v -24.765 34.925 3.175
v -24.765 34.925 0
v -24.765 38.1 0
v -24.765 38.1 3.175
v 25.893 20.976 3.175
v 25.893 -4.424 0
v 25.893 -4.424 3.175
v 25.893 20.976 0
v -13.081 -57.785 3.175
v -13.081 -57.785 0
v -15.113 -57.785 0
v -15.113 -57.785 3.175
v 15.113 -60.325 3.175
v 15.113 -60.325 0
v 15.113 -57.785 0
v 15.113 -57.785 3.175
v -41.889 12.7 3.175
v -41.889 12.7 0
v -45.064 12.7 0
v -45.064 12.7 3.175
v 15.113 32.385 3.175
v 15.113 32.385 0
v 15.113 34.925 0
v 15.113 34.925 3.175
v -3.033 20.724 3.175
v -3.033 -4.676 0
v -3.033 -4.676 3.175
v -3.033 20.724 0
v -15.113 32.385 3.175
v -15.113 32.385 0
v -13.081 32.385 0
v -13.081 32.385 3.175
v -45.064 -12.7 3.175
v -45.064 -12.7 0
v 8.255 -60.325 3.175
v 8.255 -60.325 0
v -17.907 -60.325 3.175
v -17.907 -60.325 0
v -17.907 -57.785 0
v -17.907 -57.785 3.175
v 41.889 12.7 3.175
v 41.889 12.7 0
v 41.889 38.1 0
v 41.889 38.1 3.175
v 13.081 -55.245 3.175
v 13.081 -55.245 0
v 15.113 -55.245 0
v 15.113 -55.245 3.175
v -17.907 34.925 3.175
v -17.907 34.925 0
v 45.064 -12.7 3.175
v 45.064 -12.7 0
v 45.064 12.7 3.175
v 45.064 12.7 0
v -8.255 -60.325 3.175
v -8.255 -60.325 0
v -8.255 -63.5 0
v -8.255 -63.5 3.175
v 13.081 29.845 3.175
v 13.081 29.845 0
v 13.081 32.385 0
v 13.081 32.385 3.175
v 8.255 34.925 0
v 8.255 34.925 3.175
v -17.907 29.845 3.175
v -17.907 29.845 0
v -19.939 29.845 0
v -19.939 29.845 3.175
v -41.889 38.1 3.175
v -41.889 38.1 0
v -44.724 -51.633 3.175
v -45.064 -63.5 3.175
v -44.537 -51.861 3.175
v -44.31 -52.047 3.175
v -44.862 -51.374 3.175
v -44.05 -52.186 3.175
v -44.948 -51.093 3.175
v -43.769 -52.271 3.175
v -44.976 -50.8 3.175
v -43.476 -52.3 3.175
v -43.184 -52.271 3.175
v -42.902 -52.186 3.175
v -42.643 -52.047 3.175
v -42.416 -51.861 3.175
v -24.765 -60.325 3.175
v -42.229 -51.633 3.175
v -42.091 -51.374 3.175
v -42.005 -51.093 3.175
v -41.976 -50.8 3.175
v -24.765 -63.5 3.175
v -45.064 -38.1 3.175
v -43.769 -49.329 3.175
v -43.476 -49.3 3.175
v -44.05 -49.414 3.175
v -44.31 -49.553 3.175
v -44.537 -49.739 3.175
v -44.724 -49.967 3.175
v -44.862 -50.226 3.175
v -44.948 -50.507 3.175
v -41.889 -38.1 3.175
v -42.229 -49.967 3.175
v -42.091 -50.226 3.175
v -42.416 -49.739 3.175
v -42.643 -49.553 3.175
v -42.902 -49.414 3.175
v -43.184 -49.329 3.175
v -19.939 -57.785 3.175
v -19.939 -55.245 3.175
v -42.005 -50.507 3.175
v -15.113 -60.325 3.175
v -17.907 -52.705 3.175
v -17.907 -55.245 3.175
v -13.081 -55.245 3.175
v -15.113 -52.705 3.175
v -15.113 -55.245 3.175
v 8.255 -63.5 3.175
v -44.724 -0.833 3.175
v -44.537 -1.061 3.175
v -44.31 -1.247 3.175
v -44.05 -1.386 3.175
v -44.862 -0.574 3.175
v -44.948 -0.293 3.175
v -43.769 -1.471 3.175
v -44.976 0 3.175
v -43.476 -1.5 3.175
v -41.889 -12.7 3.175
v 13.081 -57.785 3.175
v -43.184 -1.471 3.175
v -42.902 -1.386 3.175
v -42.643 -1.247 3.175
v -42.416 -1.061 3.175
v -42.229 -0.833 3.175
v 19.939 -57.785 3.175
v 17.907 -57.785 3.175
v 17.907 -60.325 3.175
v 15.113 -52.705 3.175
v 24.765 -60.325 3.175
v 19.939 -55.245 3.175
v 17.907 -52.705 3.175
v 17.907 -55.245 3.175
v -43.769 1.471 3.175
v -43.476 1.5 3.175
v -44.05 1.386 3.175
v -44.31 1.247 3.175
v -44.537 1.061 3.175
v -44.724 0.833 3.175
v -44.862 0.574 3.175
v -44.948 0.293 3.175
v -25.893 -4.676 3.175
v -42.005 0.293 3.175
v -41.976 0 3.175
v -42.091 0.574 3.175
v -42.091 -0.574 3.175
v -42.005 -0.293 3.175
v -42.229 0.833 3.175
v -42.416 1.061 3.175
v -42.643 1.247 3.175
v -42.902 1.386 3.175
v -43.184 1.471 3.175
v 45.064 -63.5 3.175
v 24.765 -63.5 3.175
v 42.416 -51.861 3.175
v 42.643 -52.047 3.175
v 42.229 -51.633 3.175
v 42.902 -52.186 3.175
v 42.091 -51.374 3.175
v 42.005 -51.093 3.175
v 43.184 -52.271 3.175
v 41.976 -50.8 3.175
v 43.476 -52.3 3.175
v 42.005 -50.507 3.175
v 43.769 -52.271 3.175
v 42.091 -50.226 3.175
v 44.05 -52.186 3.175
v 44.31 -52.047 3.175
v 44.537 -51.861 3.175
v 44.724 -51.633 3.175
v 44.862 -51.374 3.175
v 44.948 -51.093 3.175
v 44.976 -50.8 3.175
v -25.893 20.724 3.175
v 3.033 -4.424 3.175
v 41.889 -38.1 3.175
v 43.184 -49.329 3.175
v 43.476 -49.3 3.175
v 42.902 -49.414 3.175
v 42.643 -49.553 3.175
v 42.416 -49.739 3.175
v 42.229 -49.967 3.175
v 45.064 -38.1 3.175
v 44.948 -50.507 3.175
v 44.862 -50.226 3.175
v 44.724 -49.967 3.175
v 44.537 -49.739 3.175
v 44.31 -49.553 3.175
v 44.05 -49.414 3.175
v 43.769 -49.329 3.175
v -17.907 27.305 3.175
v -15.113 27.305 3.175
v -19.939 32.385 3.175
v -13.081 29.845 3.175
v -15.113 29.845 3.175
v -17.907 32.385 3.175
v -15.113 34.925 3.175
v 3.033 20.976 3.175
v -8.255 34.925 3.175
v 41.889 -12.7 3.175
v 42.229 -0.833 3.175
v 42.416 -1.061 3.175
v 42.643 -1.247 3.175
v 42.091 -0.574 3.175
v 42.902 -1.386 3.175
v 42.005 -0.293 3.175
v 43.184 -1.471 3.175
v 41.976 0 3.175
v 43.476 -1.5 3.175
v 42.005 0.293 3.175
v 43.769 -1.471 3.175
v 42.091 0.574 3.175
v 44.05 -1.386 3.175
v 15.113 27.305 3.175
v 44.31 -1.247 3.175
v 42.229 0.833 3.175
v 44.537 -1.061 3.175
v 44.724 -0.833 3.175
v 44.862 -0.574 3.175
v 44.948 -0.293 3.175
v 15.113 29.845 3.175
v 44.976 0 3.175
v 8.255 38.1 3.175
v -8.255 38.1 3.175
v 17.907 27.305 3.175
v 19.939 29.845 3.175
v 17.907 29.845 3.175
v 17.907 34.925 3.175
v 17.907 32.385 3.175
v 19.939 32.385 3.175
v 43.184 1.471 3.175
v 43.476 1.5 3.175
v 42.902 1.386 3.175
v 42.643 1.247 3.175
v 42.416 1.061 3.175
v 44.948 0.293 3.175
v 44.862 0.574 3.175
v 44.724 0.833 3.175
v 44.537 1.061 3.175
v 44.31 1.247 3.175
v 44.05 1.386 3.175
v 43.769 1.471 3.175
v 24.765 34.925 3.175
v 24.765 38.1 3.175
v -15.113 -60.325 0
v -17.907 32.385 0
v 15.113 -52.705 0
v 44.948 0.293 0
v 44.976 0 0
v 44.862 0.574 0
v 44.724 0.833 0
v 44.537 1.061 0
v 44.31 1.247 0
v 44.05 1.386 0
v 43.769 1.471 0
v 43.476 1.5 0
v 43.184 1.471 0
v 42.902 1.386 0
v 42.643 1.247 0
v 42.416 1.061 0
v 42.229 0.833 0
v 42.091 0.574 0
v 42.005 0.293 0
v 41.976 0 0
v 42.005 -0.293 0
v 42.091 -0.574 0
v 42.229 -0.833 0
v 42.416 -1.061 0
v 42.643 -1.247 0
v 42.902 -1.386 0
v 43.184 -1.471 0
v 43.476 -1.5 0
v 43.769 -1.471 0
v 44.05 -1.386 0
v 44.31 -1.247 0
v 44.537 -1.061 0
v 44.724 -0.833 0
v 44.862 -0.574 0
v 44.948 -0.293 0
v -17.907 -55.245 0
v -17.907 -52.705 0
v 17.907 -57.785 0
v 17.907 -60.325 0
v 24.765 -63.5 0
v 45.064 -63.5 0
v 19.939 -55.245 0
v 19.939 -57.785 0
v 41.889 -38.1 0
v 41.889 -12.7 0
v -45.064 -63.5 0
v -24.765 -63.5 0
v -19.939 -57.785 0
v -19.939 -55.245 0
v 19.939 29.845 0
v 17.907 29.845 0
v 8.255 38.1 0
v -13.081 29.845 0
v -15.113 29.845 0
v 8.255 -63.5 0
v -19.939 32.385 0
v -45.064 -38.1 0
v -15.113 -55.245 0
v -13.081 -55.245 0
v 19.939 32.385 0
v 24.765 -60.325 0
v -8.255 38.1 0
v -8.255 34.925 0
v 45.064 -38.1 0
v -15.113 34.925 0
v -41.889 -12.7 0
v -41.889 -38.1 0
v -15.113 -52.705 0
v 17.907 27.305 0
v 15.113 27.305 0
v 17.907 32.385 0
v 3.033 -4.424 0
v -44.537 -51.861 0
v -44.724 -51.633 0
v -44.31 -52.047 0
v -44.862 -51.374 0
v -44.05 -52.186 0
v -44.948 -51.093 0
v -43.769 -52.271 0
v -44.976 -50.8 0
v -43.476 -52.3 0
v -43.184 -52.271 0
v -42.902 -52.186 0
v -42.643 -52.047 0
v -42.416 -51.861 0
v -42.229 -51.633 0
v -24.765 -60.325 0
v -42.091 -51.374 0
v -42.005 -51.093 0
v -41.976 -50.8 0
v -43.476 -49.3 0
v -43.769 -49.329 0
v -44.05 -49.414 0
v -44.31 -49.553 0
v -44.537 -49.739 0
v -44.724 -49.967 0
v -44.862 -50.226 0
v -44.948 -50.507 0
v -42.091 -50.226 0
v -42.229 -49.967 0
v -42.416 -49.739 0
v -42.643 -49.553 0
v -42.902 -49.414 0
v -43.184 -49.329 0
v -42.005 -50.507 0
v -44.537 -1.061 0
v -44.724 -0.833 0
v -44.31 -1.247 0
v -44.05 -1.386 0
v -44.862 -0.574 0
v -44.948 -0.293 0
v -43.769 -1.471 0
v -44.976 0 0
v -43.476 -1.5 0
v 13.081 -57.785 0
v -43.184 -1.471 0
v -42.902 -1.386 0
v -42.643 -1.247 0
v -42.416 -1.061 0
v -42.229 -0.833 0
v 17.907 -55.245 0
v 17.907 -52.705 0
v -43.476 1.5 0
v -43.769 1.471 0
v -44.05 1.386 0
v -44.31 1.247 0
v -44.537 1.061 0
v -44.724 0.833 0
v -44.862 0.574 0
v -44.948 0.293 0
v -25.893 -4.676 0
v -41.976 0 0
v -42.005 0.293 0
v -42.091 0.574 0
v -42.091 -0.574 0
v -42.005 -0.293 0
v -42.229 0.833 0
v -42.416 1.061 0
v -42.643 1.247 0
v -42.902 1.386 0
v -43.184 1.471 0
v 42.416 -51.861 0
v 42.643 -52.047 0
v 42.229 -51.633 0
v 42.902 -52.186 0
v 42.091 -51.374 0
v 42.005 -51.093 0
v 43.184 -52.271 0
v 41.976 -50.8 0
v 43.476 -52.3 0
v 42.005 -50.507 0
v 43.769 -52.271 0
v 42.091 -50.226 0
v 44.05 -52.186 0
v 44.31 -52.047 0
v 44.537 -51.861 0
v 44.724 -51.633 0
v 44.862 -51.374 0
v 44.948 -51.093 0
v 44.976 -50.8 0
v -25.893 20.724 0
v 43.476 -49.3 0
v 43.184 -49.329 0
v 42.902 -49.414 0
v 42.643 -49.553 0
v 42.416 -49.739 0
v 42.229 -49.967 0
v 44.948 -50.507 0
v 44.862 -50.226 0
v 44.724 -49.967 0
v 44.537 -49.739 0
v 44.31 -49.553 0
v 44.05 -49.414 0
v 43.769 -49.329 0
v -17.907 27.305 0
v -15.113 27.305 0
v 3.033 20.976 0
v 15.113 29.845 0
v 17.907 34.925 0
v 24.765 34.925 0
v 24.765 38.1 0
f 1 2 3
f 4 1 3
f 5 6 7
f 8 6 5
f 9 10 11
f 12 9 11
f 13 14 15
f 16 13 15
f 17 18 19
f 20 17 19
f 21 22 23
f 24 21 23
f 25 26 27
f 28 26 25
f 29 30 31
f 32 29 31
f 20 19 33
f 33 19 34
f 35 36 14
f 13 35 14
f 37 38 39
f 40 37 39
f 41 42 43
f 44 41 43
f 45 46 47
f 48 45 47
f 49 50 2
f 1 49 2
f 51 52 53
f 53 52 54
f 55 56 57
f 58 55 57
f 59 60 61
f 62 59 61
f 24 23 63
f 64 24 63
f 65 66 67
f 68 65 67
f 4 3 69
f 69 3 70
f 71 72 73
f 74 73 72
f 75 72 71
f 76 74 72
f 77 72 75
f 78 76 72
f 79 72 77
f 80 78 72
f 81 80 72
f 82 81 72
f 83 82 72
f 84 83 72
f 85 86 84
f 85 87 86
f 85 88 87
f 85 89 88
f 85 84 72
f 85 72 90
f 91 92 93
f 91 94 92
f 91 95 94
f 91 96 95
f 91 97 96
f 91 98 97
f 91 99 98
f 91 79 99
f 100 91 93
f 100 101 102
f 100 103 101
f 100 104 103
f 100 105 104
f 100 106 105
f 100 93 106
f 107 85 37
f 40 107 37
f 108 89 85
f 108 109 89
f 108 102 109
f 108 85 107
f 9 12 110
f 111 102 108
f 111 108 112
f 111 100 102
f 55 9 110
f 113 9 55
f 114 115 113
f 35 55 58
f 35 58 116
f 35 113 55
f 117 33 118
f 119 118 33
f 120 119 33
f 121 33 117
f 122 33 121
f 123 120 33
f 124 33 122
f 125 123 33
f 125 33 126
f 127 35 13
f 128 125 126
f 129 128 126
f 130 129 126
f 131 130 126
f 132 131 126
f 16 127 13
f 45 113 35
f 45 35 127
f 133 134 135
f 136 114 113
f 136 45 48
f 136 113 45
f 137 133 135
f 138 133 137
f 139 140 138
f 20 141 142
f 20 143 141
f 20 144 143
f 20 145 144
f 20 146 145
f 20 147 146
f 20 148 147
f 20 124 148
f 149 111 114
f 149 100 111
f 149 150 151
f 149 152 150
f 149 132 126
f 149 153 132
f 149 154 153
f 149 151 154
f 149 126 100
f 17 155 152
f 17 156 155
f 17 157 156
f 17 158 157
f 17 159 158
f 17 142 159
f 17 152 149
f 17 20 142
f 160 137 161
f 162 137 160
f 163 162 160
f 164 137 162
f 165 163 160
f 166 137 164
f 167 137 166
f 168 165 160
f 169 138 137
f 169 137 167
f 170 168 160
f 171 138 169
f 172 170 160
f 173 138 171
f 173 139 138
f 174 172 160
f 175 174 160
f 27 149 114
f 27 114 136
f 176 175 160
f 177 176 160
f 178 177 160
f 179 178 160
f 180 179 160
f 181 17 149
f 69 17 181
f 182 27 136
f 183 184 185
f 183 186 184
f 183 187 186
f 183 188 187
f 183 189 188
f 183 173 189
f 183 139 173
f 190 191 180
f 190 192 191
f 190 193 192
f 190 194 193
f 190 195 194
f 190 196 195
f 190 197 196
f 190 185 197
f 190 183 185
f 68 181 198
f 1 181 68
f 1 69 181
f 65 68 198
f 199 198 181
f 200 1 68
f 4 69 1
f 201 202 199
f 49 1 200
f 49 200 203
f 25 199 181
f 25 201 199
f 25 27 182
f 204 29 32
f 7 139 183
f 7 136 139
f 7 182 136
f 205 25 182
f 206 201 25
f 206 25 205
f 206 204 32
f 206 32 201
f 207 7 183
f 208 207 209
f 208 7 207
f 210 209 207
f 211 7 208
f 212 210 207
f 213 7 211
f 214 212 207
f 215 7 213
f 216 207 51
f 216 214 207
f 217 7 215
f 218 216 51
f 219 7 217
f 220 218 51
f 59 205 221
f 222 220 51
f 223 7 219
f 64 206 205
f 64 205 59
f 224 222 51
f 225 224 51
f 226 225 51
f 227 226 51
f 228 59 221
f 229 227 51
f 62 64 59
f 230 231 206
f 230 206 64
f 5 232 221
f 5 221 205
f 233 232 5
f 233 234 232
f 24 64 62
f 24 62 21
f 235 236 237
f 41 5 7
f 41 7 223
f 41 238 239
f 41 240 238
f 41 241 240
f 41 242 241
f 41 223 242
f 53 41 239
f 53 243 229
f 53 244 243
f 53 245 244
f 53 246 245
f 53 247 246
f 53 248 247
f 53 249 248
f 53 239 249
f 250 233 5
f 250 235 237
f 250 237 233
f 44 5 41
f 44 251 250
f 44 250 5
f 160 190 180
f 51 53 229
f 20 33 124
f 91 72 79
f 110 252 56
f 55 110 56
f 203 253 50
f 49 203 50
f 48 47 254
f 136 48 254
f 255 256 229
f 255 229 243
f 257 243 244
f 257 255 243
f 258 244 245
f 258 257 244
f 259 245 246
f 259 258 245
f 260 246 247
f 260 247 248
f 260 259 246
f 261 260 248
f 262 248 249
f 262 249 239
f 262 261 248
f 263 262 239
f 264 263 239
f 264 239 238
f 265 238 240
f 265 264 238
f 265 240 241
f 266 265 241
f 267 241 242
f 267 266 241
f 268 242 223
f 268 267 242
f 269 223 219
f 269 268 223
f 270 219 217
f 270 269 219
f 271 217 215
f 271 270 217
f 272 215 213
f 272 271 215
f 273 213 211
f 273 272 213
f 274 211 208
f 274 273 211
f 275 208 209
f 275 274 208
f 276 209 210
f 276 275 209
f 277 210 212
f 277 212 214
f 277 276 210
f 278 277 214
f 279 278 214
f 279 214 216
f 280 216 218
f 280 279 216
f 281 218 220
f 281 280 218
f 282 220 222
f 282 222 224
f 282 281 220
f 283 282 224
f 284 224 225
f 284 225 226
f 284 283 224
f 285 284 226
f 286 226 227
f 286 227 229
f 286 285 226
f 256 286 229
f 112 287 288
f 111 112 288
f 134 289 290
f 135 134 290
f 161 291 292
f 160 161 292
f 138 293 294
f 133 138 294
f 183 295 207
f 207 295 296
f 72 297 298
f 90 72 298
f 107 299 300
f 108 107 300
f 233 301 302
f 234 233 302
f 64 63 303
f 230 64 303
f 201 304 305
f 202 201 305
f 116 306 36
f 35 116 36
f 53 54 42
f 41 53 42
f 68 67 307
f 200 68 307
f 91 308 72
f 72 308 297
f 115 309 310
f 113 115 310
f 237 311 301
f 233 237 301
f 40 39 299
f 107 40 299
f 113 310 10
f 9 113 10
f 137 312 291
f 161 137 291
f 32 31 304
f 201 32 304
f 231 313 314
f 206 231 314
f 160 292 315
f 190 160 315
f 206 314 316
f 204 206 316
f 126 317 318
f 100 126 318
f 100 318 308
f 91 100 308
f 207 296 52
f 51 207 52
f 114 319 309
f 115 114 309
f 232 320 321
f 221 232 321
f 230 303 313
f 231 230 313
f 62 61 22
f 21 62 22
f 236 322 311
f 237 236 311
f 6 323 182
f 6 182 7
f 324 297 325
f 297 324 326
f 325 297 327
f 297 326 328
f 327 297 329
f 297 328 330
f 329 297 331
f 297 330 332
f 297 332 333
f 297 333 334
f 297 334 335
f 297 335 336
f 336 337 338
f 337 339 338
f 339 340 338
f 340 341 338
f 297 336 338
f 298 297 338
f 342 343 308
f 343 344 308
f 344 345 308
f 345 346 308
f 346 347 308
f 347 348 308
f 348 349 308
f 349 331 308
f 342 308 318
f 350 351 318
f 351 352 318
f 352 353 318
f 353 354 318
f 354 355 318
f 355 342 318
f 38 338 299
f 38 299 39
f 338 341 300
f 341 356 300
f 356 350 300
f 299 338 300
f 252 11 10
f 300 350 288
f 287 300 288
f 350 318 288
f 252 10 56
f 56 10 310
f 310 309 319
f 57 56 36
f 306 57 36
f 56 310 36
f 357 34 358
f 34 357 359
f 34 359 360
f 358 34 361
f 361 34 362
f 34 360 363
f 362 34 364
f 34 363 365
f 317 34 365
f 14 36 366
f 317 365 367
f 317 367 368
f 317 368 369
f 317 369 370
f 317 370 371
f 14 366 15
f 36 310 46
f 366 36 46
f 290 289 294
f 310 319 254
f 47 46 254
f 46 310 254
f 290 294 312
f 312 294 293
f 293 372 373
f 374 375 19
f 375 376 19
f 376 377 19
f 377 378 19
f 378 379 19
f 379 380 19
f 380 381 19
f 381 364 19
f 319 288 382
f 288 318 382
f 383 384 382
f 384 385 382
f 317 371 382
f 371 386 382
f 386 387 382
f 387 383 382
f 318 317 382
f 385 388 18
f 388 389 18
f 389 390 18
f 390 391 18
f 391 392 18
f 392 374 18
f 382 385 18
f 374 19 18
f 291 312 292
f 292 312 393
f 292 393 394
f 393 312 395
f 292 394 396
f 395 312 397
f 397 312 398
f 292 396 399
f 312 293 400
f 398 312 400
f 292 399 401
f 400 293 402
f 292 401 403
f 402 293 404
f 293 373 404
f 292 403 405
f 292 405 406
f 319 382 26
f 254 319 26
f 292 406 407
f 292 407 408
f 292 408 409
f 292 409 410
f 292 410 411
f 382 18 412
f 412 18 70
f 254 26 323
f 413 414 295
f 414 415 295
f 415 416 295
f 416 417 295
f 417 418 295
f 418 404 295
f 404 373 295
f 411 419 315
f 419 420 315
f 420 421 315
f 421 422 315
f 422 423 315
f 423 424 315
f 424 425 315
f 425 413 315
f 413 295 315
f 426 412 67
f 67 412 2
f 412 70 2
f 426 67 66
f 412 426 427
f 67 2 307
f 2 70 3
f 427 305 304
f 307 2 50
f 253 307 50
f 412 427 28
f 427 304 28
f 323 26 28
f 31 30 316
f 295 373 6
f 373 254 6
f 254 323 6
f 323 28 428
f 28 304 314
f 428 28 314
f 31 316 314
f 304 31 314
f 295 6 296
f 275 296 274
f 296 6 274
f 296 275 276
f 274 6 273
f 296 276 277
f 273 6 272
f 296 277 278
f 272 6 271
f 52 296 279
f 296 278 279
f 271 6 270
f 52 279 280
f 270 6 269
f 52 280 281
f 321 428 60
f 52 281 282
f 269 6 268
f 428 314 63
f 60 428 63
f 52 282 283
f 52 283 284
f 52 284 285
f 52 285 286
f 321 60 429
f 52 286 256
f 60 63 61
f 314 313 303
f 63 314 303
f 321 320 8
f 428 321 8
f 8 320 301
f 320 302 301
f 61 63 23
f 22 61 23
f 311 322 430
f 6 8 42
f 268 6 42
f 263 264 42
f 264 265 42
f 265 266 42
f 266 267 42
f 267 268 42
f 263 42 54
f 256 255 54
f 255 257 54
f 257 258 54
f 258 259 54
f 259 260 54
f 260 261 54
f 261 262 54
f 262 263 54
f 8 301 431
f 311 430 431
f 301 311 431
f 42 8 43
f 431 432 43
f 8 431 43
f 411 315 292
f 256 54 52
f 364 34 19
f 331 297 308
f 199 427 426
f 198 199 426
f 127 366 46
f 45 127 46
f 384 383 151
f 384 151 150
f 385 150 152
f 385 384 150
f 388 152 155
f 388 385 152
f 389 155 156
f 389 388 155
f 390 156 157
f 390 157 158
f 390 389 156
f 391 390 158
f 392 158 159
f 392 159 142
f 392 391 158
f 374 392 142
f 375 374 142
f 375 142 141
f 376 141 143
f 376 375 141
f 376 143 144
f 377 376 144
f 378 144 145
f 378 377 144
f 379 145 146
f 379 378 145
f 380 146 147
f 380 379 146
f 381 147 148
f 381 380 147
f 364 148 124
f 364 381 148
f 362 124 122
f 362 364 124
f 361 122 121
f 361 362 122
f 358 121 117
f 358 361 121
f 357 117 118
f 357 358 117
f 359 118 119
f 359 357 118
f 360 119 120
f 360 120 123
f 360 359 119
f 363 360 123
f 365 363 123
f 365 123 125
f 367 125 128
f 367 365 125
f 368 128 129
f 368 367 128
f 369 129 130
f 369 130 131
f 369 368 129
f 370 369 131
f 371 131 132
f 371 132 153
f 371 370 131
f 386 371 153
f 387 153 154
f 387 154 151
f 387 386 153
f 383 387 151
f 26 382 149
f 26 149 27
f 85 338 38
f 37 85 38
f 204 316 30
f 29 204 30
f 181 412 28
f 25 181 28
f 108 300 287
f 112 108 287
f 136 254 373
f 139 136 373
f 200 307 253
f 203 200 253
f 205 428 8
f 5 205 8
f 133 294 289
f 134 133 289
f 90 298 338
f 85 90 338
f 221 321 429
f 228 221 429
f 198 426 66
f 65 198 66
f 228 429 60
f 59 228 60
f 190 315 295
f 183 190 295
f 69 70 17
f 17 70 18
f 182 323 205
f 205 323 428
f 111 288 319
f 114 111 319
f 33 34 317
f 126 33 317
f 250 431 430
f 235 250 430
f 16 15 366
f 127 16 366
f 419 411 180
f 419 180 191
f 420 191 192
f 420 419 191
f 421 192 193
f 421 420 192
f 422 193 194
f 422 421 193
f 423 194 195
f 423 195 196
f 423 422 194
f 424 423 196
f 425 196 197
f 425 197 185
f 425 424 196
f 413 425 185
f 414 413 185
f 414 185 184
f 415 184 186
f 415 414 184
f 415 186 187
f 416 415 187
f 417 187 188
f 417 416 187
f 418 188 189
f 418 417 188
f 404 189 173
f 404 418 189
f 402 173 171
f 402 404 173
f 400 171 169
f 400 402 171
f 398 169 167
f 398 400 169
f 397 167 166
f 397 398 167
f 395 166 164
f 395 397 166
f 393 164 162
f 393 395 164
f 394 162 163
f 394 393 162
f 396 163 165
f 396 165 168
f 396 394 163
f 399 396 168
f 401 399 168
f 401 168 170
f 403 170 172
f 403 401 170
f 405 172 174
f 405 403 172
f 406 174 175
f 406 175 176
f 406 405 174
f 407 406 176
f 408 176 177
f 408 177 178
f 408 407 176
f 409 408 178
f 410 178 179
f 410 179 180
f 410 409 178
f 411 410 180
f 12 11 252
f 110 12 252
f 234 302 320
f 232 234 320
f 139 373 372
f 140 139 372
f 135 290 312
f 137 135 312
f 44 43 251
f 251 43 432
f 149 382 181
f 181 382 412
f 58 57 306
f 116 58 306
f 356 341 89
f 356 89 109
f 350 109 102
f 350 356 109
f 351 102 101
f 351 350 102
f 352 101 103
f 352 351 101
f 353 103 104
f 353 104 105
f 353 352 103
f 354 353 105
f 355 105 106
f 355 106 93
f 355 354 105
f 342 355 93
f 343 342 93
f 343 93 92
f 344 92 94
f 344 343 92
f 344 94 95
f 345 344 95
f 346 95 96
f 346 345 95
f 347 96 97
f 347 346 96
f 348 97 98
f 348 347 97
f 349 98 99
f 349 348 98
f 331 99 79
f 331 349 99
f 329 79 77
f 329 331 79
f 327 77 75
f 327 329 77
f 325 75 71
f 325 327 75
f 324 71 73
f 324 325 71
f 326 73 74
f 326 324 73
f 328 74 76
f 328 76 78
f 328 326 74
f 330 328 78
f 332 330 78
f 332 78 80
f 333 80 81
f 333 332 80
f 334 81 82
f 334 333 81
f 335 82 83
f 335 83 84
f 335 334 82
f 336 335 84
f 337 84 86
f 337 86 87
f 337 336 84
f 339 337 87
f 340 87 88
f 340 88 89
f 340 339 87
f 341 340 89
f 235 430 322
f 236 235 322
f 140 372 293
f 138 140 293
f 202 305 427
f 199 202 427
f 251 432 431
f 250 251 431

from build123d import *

# Parameters (mm, degrees)
F0_R     = 1.5
F0_W     = 22.86
F0_H     = 25.4
F1_DEPTH = 3.175


# Not quite as in the source:
# - a length typed as a fraction of an inch, garbled in the dataset ("3 / 203.2 mm" for 3/8 in), is restored


with BuildPart() as f1:
    # F0 (on Top) → F1 (new body)
    with BuildSketch(Plane.XY):
        Polygon((-41.8889727067, -63.5), (-24.765, -63.5), (-24.765, -60.325), (-17.907, -60.325), (-17.907, -57.785), (-19.939, -57.785), (-19.939, -55.245), (-17.907, -55.245), (-17.907, -52.705), (-15.113, -52.705), (-15.113, -55.245), (-13.081, -55.245), (-13.081, -57.785), (-15.113, -57.785), (-15.113, -60.325), (-8.255, -60.325), (-8.255, -63.5), (8.255, -63.5), (8.255, -60.325), (15.113, -60.325), (15.113, -57.785), (13.081, -57.785), (13.081, -55.245), (15.113, -55.245), (15.113, -52.705), (17.907, -52.705), (17.907, -55.245), (19.939, -55.245), (19.939, -57.785), (17.907, -57.785), (17.907, -60.325), (24.765, -60.325), (24.765, -63.5), (41.8889727067, -63.5), (41.91, -63.5), (45.0639727067, -63.5), (45.0639727067, -38.1), (41.8889727067, -38.1), (41.8889727067, -12.7), (45.0639727067, -12.7), (45.0639727067, 12.7), (41.8889727067, 12.7), (41.8889727067, 38.1), (24.765, 38.1), (24.765, 34.925), (17.907, 34.925), (17.907, 32.385), (19.939, 32.385), (19.939, 29.845), (17.907, 29.845), (17.907, 27.305), (15.113, 27.305), (15.113, 29.845), (13.081, 29.845), (13.081, 32.385), (15.113, 32.385), (15.113, 34.925), (8.255, 34.925), (8.255, 38.1), (-8.255, 38.1), (-8.255, 34.925), (-15.113, 34.925), (-15.113, 32.385), (-13.081, 32.385), (-13.081, 29.845), (-15.113, 29.845), (-15.113, 27.305), (-17.907, 27.305), (-17.907, 29.845), (-19.939, 29.845), (-19.939, 32.385), (-17.907, 32.385), (-17.907, 34.925), (-24.765, 34.925), (-24.765, 38.1), (-41.8889727067, 38.1), (-41.8889727067, 12.7), (-45.0639727067, 12.7), (-45.0639727067, -12.7), (-41.8889727067, -12.7), (-41.8889727067, -38.1), (-45.0639727067, -38.1), (-45.0639727067, -63.5), (-41.91, -63.5), align=None)
        with Locations((-43.4764727067, -50.8)):
            Circle(F0_R, mode=Mode.SUBTRACT)
        with Locations((43.4764727067, -50.8)):
            Circle(F0_R, mode=Mode.SUBTRACT)
        with Locations((-43.4764727067, 0)):
            Circle(F0_R, mode=Mode.SUBTRACT)
        with Locations((-14.4632559413, 8.0235061839)):
            Rectangle(F0_W, F0_H, mode=Mode.SUBTRACT)
        with Locations((14.4632559413, 8.2762846043)):
            Rectangle(F0_W, F0_H, mode=Mode.SUBTRACT)
        with Locations((43.4764727067, 0)):
            Circle(F0_R, mode=Mode.SUBTRACT)
    extrude(amount=F1_DEPTH)


solid = f1.part
